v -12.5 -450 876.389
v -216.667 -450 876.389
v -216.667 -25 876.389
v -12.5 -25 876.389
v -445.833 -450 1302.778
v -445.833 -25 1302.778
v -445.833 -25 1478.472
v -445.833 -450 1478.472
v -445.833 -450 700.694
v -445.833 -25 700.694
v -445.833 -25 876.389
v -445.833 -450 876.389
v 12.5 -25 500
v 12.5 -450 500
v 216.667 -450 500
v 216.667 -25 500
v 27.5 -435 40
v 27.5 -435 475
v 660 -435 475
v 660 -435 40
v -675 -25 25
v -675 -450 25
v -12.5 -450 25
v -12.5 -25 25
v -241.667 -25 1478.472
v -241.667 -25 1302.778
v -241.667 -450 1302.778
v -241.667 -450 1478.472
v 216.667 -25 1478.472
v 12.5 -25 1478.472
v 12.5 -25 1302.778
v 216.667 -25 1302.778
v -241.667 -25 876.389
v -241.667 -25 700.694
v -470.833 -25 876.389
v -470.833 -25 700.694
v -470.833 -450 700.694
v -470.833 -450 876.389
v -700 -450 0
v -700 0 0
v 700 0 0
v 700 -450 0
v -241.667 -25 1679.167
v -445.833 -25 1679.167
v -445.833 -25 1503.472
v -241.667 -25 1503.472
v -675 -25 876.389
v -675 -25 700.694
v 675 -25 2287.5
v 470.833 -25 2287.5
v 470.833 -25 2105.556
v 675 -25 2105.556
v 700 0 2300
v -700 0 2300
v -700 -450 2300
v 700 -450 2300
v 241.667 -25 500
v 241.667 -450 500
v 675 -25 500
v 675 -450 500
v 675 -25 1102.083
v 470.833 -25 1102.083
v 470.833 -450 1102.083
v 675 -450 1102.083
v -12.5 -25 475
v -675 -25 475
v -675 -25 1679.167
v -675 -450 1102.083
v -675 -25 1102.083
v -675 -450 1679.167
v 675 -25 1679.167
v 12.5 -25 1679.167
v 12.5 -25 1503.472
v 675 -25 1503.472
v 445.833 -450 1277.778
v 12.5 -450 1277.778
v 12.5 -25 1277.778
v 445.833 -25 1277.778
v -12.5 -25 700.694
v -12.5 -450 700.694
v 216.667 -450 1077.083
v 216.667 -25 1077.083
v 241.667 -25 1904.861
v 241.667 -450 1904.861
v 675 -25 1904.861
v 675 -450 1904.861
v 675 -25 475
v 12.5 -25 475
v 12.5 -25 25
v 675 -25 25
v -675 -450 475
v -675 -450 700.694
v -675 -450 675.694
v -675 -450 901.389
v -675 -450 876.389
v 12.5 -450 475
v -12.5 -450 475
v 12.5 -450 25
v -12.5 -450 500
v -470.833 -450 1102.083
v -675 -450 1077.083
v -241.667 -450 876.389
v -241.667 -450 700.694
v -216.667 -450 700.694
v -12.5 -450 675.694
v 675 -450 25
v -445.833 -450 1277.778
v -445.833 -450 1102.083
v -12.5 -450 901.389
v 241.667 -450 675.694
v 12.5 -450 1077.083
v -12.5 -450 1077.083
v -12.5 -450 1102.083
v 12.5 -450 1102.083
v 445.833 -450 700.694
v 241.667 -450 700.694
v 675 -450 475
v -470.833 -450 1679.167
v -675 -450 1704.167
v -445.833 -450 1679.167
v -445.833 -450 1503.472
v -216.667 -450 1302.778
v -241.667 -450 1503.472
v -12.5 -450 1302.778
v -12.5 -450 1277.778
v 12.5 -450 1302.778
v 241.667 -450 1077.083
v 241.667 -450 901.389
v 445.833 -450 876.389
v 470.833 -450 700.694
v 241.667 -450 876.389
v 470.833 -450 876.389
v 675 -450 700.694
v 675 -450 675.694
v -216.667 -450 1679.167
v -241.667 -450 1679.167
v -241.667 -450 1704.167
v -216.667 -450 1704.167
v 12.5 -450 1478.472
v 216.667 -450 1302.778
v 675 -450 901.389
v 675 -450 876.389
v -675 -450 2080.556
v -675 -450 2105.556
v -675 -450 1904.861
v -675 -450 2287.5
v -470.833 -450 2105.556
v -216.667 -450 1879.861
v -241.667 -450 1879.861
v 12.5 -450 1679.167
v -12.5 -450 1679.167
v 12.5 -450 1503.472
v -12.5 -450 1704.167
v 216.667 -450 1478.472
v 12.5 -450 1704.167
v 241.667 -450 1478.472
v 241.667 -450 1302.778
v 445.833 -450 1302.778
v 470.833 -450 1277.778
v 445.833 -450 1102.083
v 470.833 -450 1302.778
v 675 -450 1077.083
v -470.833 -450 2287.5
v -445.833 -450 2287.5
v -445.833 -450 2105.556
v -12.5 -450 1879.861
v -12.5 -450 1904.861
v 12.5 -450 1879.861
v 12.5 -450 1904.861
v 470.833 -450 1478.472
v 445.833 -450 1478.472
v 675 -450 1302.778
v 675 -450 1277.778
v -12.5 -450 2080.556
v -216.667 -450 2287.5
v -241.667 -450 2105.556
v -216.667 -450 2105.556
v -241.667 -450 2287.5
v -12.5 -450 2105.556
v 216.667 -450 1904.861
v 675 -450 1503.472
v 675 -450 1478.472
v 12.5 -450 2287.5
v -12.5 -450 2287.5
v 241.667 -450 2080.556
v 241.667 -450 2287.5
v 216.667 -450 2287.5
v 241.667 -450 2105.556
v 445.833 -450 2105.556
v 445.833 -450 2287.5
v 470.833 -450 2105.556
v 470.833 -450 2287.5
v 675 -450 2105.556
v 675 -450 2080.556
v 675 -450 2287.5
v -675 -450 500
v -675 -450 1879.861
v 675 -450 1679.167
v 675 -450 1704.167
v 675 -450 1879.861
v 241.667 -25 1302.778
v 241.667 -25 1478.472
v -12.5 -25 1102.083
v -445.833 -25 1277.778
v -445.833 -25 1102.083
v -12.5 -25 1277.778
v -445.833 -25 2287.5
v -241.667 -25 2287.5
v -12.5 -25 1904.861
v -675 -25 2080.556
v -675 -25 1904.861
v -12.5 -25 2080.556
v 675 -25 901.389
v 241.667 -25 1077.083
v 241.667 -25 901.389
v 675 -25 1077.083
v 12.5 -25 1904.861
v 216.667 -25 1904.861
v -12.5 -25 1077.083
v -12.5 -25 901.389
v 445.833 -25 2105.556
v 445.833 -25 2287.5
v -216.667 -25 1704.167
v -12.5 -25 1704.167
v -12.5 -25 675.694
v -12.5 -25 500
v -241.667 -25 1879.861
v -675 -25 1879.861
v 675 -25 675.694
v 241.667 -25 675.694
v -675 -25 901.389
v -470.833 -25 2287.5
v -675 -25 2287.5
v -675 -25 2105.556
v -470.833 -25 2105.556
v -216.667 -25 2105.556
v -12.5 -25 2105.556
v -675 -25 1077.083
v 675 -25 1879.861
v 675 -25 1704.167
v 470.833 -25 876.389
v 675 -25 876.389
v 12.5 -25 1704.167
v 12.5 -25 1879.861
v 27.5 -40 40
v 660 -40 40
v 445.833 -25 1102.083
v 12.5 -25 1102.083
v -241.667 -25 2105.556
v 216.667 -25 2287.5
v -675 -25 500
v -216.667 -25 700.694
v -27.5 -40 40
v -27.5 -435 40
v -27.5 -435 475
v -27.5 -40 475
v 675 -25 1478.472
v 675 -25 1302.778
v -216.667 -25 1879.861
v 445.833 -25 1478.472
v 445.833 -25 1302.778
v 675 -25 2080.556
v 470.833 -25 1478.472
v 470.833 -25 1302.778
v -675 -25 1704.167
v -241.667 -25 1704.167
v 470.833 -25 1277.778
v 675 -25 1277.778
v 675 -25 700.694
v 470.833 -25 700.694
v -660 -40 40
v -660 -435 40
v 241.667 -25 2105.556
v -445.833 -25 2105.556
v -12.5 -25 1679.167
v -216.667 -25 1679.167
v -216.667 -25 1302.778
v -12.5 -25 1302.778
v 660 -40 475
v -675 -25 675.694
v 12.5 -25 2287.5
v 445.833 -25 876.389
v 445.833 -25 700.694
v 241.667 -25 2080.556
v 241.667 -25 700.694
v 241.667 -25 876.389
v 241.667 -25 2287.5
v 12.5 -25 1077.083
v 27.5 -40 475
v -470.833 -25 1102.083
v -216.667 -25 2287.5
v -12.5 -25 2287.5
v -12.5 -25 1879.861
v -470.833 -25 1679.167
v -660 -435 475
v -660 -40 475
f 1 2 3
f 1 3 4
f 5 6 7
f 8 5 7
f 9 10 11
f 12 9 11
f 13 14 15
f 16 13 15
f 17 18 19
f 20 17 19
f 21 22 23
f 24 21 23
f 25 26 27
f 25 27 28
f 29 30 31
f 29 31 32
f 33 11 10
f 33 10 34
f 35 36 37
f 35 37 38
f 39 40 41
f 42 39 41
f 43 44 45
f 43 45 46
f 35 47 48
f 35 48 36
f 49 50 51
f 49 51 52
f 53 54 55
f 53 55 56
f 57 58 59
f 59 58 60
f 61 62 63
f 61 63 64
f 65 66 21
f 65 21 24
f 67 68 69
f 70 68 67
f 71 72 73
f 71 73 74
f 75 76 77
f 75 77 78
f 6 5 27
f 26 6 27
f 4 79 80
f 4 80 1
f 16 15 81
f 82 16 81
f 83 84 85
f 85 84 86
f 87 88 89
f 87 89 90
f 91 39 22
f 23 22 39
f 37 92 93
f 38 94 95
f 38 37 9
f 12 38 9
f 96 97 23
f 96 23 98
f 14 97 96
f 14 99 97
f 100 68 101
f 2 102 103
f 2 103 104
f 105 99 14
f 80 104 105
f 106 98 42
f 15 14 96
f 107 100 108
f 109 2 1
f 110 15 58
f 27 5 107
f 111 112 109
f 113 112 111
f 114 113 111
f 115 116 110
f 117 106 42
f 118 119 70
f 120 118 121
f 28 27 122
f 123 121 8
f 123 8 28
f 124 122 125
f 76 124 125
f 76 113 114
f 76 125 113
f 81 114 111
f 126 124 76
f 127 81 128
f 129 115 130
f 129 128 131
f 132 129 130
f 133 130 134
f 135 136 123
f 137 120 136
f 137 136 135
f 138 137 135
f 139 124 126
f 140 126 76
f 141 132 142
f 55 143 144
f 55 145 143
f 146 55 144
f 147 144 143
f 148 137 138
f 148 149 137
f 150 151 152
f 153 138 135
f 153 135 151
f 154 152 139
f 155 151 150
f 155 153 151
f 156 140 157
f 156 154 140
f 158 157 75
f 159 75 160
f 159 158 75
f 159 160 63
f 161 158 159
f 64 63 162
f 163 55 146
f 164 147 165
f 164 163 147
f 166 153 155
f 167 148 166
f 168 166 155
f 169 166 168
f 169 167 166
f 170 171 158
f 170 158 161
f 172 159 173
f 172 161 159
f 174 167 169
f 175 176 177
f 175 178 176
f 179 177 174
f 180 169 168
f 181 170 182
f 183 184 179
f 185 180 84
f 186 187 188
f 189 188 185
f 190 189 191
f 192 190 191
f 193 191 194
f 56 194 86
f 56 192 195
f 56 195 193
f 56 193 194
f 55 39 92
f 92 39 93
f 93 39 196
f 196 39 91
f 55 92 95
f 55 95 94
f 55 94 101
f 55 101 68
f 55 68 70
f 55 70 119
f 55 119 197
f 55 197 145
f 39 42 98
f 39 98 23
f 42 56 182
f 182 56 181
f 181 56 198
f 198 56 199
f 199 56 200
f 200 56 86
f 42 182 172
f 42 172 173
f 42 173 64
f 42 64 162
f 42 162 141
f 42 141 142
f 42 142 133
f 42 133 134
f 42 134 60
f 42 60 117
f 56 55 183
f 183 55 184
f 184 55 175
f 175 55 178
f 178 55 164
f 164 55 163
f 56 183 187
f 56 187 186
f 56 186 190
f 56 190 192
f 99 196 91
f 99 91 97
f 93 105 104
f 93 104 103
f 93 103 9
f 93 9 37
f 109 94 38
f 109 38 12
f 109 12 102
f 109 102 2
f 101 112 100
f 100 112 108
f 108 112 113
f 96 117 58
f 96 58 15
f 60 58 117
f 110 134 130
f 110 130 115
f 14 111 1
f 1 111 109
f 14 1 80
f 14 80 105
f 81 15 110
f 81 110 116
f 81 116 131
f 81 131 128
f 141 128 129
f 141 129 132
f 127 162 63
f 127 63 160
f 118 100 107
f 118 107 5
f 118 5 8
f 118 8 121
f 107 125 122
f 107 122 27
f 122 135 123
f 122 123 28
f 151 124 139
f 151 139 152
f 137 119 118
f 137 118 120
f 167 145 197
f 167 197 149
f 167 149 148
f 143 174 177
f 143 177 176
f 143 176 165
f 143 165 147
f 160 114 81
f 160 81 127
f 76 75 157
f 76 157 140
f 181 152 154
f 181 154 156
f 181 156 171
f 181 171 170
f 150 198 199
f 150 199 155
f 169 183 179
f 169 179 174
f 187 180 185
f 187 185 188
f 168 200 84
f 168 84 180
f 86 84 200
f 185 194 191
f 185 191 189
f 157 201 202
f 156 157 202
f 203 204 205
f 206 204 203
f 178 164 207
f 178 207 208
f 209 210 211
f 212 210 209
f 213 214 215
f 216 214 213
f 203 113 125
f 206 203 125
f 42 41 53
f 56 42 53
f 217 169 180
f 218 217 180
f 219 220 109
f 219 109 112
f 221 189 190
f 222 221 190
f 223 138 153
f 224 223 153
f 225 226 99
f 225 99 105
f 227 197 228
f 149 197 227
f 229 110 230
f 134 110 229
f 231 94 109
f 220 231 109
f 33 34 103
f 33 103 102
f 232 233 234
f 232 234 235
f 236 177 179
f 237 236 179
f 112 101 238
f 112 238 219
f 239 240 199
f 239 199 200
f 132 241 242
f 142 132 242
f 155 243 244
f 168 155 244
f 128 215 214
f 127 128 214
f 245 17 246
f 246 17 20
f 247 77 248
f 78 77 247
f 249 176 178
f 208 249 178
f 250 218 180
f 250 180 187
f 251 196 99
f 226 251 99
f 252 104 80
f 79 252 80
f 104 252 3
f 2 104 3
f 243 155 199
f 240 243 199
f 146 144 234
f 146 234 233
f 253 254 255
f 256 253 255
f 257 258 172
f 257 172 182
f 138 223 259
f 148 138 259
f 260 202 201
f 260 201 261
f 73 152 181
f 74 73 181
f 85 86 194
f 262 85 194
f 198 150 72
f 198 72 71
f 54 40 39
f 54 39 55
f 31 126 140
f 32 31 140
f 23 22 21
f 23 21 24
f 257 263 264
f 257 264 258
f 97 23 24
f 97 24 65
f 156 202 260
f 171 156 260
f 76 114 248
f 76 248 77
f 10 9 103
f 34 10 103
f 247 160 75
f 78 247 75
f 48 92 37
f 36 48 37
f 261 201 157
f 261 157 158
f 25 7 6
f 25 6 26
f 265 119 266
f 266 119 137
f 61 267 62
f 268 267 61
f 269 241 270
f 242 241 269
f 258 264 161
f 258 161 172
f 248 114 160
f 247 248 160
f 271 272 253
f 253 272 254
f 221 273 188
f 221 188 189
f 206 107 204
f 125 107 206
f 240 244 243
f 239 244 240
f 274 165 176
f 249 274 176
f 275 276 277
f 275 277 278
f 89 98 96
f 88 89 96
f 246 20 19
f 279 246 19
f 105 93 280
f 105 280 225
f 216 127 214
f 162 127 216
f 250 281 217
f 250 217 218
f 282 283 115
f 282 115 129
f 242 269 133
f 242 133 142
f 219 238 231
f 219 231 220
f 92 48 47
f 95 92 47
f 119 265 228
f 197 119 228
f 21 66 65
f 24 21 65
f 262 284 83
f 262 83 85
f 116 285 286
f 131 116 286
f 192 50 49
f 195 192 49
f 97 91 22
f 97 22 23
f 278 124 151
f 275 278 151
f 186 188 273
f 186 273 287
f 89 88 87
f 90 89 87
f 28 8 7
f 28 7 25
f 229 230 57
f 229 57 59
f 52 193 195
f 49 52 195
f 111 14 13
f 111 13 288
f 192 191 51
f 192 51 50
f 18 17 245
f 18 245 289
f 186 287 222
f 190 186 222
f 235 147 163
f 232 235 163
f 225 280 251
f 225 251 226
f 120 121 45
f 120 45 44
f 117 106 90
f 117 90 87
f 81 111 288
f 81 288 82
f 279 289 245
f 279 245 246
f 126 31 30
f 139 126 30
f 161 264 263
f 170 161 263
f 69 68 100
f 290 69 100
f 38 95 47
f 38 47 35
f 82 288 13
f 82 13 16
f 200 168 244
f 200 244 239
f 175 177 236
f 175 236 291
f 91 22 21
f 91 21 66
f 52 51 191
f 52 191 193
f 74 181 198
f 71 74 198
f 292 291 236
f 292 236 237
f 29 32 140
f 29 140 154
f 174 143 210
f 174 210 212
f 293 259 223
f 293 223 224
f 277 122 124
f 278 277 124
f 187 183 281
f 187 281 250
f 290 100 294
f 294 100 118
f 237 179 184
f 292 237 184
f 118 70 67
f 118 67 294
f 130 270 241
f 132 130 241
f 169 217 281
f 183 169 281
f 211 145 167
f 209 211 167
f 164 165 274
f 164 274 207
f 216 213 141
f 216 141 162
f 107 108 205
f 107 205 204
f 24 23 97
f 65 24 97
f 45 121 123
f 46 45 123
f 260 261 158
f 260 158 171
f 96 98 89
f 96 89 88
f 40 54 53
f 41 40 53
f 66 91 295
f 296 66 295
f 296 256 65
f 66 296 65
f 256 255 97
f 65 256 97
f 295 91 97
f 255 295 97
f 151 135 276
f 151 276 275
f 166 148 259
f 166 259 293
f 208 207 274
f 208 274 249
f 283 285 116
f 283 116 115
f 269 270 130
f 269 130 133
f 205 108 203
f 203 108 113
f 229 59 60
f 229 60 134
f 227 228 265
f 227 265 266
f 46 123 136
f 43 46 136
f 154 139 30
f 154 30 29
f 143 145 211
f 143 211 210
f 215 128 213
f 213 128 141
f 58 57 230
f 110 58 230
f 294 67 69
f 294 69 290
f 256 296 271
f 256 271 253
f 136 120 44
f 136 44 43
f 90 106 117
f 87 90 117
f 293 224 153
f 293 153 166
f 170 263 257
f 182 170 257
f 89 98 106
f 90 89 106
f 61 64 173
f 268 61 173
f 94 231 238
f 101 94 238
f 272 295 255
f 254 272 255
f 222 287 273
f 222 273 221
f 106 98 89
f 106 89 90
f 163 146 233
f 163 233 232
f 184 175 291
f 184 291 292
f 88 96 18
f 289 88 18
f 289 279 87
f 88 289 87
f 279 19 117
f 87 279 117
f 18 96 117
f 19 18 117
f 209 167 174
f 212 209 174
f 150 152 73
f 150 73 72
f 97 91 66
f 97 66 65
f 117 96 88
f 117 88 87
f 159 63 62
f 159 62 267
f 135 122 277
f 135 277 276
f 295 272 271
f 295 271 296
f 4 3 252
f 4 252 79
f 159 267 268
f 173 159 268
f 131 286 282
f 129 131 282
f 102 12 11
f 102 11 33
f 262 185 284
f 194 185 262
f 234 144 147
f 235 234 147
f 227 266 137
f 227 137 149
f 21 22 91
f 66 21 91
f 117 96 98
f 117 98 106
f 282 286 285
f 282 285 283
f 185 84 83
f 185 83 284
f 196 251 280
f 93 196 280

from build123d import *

# Parameters (mm, degrees)
F0_W     = 1400
F0_H     = 2300
F1_DEPTH = 450
F2_W     = 204.1666666667
F2_H     = 181.9444444444
F2_H_2   = 382.6388888889
F2_W_2   = 662.5
F2_H_3   = 175.6944444444
F2_W_3   = 433.3333333333
F2_H_4   = 577.0833333333
F2_H_5   = 376.3888888889
F2_H_6   = 450
F3_DEPTH = 425
F4_DEPTH = 425
F5_T     = -15
F5_2_T   = -15


with BuildPart() as f1:
    # F0 (on Front) → F1 (new body)
    with BuildSketch(Plane.XZ):
        with Locations((0, 1150)):
            Rectangle(F0_W, F0_H)
    extrude(amount=F1_DEPTH)

    # F2 (on face) → F3 (cut, through all)
    with BuildSketch(Plane.XZ.offset(450)):
        with Locations((-572.9166666667, 2196.5277777778)):
            Rectangle(F2_W, F2_H)
        with Locations((-343.75, 2196.5277777778)):
            Rectangle(F2_W, F2_H)
        with Locations((-114.5833333333, 2196.5277777778)):
            Rectangle(F2_W, F2_H)
        with Locations((114.5833333333, 2096.1805555556)):
            Rectangle(F2_W, F2_H_2)
        with Locations((343.75, 2196.5277777778)):
            Rectangle(F2_W, F2_H)
        with Locations((572.9166666667, 2196.5277777778)):
            Rectangle(F2_W, F2_H)
        with Locations((-343.75, 1992.7083333333)):
            Rectangle(F2_W_2, F2_H_3)
        with Locations((458.3333333333, 1992.7083333333)):
            Rectangle(F2_W_3, F2_H_3)
        with Locations((-458.3333333333, 1792.0138888889)):
            Rectangle(F2_W_3, F2_H_3)
        with Locations((-114.5833333333, 1792.0138888889)):
            Rectangle(F2_W, F2_H_3)
        with Locations((343.75, 1792.0138888889)):
            Rectangle(F2_W_2, F2_H_3)
        with Locations((-572.9166666667, 1390.625)):
            Rectangle(F2_W, F2_H_4)
        with Locations((-343.75, 1591.3194444444)):
            Rectangle(F2_W, F2_H_3)
        with Locations((-343.75, 1390.625)):
            Rectangle(F2_W, F2_H_3)
        with Locations((-229.1666666667, 1189.9305555556)):
            Rectangle(F2_W_3, F2_H_3)
        with Locations((-114.5833333333, 1490.9722222222)):
            Rectangle(F2_W, F2_H_5)
        with Locations((343.75, 1591.3194444444)):
            Rectangle(F2_W_2, F2_H_3)
        with Locations((114.5833333333, 1390.625)):
            Rectangle(F2_W, F2_H_3)
        with Locations((343.75, 1390.625)):
            Rectangle(F2_W, F2_H_3)
        with Locations((572.9166666667, 1390.625)):
            Rectangle(F2_W, F2_H_3)
        with Locations((229.1666666667, 1189.9305555556)):
            Rectangle(F2_W_3, F2_H_3)
        with Locations((572.9166666667, 1189.9305555556)):
            Rectangle(F2_W, F2_H_3)
        with Locations((-343.75, 989.2361111111)):
            Rectangle(F2_W_2, F2_H_3)
        with Locations((-572.9166666667, 788.5416666667)):
            Rectangle(F2_W, F2_H_3)
        with Locations((-343.75, 788.5416666667)):
            Rectangle(F2_W, F2_H_3)
        with Locations((-114.5833333333, 788.5416666667)):
            Rectangle(F2_W, F2_H_3)
        with Locations((-343.75, 587.8472222222)):
            Rectangle(F2_W_2, F2_H_3)
        with Locations((114.5833333333, 788.5416666667)):
            Rectangle(F2_W, F2_H_4)
        with Locations((458.3333333333, 989.2361111111)):
            Rectangle(F2_W_3, F2_H_3)
        with Locations((343.75, 788.5416666667)):
            Rectangle(F2_W, F2_H_3)
        with Locations((572.9166666667, 788.5416666667)):
            Rectangle(F2_W, F2_H_3)
        with Locations((458.3333333333, 587.8472222222)):
            Rectangle(F2_W_3, F2_H_3)
        with Locations((-343.75, 250)):
            Rectangle(F2_W_2, F2_H_6)
        with Locations((343.75, 250)):
            Rectangle(F2_W_2, F2_H_6)
    extrude(amount=-F3_DEPTH, mode=Mode.SUBTRACT)


with BuildPart() as f4:
    # F2 (on face) → F4 (new body, through all)
    with BuildSketch(Plane.XZ.offset(450)):
        with Locations((-343.75, 250)):
            Rectangle(F2_W_2, F2_H_6)
    extrude(amount=-F4_DEPTH)

    # F5
    f5_openings = [f4.faces().sort_by_distance(p)[0] for p in [
        (-343.75, -237.5, 475),
    ]]
    offset(amount=F5_T, openings=f5_openings)


with BuildPart() as f4b:
    # F2 (on face) → F4, piece 2 (new body, through all)
    with BuildSketch(Plane.XZ.offset(450)):
        with Locations((343.75, 250)):
            Rectangle(F2_W_2, F2_H_6)
    extrude(amount=-F4_DEPTH)

    # F5#2
    f5_2_openings = [f4b.faces().sort_by_distance(p)[0] for p in [
        (343.75, -237.5, 475),
    ]]
    offset(amount=F5_2_T, openings=f5_2_openings)


solid = Compound([f1.part, f4.part, f4b.part])
